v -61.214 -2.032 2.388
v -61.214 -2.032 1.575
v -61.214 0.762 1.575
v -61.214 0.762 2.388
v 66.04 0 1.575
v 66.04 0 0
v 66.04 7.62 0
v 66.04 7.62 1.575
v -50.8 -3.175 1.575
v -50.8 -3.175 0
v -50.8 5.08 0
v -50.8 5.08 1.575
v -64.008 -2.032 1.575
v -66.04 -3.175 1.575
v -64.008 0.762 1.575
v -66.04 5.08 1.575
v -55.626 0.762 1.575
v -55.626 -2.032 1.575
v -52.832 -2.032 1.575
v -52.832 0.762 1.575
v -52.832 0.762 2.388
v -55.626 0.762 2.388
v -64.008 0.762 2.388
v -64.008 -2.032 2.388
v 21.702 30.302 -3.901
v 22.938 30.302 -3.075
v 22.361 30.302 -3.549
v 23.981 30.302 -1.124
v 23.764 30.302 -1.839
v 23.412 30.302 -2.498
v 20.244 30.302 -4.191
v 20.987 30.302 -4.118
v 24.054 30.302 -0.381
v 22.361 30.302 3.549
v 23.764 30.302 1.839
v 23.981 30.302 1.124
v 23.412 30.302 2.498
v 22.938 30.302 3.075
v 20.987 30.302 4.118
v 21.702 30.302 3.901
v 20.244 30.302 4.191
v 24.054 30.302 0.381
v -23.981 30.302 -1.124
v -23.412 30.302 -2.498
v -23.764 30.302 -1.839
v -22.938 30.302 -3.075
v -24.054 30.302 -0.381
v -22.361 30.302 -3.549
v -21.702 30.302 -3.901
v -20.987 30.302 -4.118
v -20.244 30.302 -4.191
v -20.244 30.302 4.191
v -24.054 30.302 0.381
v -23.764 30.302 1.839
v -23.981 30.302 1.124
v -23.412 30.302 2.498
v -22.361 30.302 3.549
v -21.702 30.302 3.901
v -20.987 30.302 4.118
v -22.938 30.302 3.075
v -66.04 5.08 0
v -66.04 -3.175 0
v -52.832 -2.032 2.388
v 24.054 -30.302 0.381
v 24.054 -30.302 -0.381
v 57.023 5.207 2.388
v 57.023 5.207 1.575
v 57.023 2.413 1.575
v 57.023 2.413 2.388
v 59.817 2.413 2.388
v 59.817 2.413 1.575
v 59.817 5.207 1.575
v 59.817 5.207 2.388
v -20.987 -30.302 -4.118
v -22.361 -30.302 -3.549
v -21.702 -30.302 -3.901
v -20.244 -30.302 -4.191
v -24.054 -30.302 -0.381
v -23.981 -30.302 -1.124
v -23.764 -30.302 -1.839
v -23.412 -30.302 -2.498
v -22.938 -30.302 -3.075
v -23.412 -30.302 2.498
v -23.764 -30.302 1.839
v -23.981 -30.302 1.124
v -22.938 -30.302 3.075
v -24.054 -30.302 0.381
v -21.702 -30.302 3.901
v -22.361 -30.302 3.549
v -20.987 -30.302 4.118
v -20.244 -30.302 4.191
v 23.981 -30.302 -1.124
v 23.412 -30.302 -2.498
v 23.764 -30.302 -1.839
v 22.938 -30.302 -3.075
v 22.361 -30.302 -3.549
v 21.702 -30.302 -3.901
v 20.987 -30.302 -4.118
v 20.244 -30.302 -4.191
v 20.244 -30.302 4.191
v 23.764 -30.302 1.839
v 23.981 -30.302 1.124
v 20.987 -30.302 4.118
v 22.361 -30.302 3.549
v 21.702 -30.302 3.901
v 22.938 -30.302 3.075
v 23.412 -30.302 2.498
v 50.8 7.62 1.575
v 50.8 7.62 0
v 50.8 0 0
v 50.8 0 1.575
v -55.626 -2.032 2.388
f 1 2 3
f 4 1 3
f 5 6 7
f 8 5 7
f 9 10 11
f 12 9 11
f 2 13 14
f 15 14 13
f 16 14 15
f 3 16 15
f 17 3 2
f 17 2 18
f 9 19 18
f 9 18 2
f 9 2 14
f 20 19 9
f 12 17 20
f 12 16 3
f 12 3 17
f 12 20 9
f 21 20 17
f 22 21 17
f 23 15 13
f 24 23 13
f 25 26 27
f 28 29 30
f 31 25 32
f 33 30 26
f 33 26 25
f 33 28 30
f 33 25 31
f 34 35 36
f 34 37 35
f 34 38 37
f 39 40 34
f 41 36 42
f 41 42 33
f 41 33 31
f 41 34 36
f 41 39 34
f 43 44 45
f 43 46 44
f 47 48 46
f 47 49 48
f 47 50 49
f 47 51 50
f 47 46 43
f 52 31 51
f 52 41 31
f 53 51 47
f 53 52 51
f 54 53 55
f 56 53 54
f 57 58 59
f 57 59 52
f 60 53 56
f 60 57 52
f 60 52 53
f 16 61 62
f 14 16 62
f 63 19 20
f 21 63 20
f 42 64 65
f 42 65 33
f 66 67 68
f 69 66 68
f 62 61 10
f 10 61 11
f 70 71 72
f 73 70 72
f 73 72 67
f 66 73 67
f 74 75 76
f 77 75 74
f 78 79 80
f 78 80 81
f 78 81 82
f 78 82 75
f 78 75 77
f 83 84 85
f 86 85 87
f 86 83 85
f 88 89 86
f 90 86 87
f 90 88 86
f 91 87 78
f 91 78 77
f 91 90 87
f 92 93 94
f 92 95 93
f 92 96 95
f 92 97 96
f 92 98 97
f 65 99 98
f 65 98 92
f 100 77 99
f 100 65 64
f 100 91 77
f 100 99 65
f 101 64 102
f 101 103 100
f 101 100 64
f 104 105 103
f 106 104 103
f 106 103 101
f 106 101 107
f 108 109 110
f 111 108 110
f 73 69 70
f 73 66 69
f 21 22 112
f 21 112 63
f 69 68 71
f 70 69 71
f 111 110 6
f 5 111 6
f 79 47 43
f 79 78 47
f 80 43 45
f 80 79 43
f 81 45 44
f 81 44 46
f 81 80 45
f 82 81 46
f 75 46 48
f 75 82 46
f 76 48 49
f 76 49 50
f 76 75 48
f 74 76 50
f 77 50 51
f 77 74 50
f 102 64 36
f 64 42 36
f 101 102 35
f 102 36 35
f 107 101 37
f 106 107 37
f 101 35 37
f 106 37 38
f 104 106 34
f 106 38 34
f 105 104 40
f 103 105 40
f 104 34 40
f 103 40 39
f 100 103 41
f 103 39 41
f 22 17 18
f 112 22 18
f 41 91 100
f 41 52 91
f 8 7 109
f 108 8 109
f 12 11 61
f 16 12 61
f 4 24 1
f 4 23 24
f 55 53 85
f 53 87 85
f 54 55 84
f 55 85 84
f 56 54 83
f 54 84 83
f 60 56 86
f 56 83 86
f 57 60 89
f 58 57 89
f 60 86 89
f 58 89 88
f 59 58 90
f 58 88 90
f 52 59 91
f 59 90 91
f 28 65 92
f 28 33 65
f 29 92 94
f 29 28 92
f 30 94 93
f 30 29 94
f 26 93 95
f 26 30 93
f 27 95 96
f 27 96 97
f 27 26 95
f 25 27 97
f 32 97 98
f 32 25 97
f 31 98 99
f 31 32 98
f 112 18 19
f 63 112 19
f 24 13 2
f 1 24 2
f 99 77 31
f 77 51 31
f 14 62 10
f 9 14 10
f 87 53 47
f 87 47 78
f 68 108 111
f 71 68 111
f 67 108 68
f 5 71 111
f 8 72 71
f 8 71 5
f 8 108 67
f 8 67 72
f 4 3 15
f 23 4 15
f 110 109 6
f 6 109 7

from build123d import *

# Parameters (mm, degrees)
F1_DEPTH = 4.191
F2_W     = 5.588
F2_H     = 0.635
F2_W_2   = 1.397
F2_H_2   = 1.397
F3_DEPTH = 1.5748
F4_DEPTH = 2.3876
F6_DEPTH = 1.5748
F7_DEPTH = 2.3876
F8_R     = 3.81


with BuildPart() as f1:
    # F0 (on Top) → F1 (new body, symmetric)
    with BuildSketch(Plane.XY):
        Polygon((0, -30.3022), (0, 0), (0, 30.3022), (-24.0538, 30.3022), (-24.0538, -30.3022), align=None)
        Polygon((0, 30.3022), (0, 0), (0, -30.3022), (24.0538, -30.3022), (24.0538, 30.3022), align=None)
    extrude(amount=F1_DEPTH, both=True)

    # F8
    f8_edges = [f1.edges().sort_by_distance(p)[0] for p in [
        (-24.0538, 0, 4.191),
        (-24.0538, 0, -4.191),
        (24.0538, 0, 4.191),
        (24.0538, 0, -4.191),
    ]]
    fillet(f8_edges, radius=F8_R)


with BuildPart() as f3:
    # F2 (on Top) → F3 (new body)
    with BuildSketch(Plane.XY):
        Polygon((-52.832, 0), (-50.8, 0), (-50.8, 5.08), (-66.04, 5.08), (-66.04, -3.175), (-62.611, -3.175), (-62.611, -2.032), (-64.008, -2.032), (-64.008, 0.762), (-61.214, 0.762), (-61.214, 0), (-55.626, 0), (-55.626, 0.762), (-52.832, 0.762), align=None)
        Polygon((-50.8, -3.175), (-50.8, 0), (-52.832, 0), (-52.832, -2.032), (-55.626, -2.032), (-55.626, -0.635), (-61.214, -0.635), (-61.214, -2.032), (-62.611, -2.032), (-62.611, -3.175), align=None)
        with Locations((-58.42, -0.3175)):
            Rectangle(F2_W, F2_H)
        Polygon((-64.008, -2.032), (-62.611, -2.032), (-62.611, -0.635), (-61.214, -0.635), (-61.214, 0), (-61.214, 0.762), (-64.008, 0.762), align=None)
        Polygon((-52.832, -2.032), (-52.832, 0), (-54.229, 0), (-55.626, 0), (-55.626, -0.635), (-55.626, -2.032), align=None)
        with Locations((-61.9125, -1.3335)):
            Rectangle(F2_W_2, F2_H_2)
        Polygon((-54.229, 0), (-52.832, 0), (-52.832, 0.762), (-55.626, 0.762), (-55.626, 0), align=None)
    extrude(amount=F3_DEPTH)

    # F2 (on Top) → F4 (join)
    with BuildSketch(Plane.XY):
        Polygon((-64.008, -2.032), (-62.611, -2.032), (-62.611, -0.635), (-61.214, -0.635), (-61.214, 0), (-61.214, 0.762), (-64.008, 0.762), align=None)
        with Locations((-61.9125, -1.3335)):
            Rectangle(F2_W_2, F2_H_2)
        Polygon((-52.832, -2.032), (-52.832, 0), (-54.229, 0), (-55.626, 0), (-55.626, -0.635), (-55.626, -2.032), align=None)
        Polygon((-54.229, 0), (-52.832, 0), (-52.832, 0.762), (-55.626, 0.762), (-55.626, 0), align=None)
    extrude(amount=F4_DEPTH)


with BuildPart() as f6:
    # F5 (on Top) → F6 (new body)
    with BuildSketch(Plane.XY):
        Polygon((50.8, 7.62), (50.8, 0), (58.42, 0), (66.04, 0), (66.04, 7.62), align=None)
        Polygon((59.817, 2.413), (58.42, 2.413), (57.023, 2.413), (57.023, 5.207), (59.817, 5.207), align=None, mode=Mode.SUBTRACT)
        Polygon((57.023, 2.413), (58.42, 2.413), (59.817, 2.413), (59.817, 5.207), (57.023, 5.207), align=None)
    extrude(amount=F6_DEPTH)

    # F5 (on Top) → F7 (join)
    with BuildSketch(Plane.XY):
        Polygon((57.023, 2.413), (58.42, 2.413), (59.817, 2.413), (59.817, 5.207), (57.023, 5.207), align=None)
    extrude(amount=F7_DEPTH)


solid = Compound([f1.part, f3.part, f6.part])
